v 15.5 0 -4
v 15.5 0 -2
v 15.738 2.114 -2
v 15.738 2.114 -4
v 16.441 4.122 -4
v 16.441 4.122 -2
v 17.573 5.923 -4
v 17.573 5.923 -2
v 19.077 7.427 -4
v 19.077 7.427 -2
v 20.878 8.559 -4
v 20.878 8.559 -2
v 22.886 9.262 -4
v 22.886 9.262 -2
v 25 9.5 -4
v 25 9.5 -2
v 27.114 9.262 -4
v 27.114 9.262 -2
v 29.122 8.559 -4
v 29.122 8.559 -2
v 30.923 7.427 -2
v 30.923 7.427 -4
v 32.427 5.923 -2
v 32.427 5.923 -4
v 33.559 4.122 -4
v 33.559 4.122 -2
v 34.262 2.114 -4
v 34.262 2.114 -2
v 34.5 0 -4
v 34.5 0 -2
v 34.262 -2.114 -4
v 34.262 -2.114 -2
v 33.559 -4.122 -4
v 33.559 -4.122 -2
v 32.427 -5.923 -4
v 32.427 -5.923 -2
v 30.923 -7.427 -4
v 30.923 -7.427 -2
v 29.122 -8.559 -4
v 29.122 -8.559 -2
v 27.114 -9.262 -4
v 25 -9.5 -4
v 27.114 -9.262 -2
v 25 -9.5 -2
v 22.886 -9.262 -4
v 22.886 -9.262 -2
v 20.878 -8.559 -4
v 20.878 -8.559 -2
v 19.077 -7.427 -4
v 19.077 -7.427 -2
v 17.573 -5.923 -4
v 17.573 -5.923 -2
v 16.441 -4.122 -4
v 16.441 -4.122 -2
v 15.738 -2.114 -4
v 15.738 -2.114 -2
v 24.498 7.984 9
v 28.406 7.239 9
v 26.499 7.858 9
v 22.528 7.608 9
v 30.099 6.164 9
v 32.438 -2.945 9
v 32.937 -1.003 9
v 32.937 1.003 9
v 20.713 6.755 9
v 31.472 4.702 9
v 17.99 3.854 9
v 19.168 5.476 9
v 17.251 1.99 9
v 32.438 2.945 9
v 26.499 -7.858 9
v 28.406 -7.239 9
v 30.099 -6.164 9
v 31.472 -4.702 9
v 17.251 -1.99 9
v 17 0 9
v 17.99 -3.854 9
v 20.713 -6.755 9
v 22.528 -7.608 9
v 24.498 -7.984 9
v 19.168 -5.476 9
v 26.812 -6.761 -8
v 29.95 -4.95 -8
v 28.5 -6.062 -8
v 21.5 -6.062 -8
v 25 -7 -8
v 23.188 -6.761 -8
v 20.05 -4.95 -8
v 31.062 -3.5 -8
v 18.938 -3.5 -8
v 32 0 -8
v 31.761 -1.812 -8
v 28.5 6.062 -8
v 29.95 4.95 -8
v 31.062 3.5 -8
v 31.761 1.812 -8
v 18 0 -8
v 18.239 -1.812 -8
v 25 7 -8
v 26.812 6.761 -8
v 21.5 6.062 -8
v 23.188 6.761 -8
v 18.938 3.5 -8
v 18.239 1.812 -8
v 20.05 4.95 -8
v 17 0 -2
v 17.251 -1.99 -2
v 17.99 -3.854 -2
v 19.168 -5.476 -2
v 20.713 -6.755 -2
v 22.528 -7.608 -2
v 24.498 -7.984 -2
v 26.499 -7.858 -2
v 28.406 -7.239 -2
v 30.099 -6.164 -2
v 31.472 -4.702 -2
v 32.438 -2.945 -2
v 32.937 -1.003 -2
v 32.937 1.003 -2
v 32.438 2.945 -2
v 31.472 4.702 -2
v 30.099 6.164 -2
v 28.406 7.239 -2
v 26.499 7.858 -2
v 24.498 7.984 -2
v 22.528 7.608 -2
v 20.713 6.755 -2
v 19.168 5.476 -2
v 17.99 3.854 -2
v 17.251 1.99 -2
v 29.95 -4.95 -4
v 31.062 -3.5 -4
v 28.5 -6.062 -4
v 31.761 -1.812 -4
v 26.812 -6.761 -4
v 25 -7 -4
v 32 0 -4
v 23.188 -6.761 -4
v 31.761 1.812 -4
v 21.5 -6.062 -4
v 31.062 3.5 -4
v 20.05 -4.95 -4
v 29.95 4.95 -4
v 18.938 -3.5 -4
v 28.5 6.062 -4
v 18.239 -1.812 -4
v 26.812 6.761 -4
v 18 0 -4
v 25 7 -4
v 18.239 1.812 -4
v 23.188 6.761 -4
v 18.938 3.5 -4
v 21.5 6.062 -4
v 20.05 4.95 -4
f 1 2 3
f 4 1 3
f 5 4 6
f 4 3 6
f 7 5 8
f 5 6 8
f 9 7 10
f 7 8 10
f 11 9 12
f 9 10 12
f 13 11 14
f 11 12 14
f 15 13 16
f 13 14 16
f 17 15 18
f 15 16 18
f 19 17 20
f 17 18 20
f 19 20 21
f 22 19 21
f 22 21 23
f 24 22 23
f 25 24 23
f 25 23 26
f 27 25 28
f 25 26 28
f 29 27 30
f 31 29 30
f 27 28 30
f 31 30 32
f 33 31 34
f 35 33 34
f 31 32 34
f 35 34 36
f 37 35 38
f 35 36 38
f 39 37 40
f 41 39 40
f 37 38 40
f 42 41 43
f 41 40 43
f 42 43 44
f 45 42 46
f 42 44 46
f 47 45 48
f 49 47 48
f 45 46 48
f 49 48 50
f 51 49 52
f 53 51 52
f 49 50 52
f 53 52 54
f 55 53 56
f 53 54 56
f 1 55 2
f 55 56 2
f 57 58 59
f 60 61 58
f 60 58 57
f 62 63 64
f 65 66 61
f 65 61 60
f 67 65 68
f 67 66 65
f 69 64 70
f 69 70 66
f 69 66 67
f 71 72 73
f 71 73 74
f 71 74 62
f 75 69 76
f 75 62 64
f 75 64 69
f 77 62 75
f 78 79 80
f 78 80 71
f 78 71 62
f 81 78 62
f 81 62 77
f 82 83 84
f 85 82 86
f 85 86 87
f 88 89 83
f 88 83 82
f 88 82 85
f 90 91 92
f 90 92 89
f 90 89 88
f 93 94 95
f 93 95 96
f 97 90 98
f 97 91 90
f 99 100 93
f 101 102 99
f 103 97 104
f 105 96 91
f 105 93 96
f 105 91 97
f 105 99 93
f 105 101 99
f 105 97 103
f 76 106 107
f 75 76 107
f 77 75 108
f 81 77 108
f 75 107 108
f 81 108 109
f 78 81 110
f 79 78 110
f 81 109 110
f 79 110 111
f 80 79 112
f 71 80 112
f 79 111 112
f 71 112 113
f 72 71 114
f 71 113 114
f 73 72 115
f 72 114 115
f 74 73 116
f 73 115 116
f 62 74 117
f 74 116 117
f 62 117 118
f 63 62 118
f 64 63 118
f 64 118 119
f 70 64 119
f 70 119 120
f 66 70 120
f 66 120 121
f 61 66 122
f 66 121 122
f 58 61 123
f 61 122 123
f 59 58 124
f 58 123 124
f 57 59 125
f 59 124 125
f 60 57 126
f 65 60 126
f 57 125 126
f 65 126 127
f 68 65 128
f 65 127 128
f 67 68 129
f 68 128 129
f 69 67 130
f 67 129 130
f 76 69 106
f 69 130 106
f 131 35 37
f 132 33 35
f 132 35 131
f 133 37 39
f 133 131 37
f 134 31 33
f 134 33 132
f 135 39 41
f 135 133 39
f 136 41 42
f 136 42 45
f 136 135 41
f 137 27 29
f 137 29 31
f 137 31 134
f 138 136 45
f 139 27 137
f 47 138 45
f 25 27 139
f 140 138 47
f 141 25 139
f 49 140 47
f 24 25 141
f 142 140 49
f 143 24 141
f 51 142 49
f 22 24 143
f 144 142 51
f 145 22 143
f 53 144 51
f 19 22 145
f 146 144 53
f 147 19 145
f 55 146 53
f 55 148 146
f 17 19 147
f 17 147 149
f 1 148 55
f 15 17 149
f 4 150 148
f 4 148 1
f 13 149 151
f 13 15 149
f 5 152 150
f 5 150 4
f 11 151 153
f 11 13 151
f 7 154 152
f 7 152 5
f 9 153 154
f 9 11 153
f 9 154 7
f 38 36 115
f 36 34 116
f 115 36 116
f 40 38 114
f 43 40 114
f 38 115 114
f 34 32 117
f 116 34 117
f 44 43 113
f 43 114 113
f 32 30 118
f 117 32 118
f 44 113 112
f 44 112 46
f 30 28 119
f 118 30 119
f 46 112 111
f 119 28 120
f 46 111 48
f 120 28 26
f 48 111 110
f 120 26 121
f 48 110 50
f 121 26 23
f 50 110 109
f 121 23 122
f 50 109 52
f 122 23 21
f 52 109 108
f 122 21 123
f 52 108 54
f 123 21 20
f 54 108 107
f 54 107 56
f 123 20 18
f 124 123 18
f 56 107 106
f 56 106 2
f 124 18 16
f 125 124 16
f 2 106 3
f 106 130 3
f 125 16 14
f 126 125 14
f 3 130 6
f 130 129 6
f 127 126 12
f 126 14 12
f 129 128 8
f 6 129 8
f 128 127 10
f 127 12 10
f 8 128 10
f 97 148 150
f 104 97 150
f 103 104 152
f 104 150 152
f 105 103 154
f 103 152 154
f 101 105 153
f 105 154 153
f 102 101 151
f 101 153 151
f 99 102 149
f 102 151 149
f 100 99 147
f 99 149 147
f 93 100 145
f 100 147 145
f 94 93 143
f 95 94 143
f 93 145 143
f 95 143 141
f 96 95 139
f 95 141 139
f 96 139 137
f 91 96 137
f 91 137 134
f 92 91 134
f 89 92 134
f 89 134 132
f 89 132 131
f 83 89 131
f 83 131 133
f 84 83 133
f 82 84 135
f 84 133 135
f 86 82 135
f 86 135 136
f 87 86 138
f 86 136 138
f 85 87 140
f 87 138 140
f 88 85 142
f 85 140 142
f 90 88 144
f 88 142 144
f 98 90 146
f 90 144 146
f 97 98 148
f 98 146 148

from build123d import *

# Parameters (mm, degrees)
SKETCH010_R             = 9.5
PAD008_DEPTH            = 2
SKETCH011_R             = 7
PAD009_DEPTH            = 4
SKETCH012_R             = 8
PAD010_DEPTH            = 11
BODY003_PLACEMENT_ANGLE = 180


with BuildPart() as part:
    # Sketch010 → Pad008 (new body)
    with BuildSketch(Plane.XY):
        Circle(SKETCH010_R)
    extrude(amount=PAD008_DEPTH)

    # Sketch011 (on Face3 of Pad008) → Pad009 (join)
    with BuildSketch(Plane.XY.offset(2)):
        Circle(SKETCH011_R)
    extrude(amount=PAD009_DEPTH)

    # Sketch012 (on Face2 of Pad009) → Pad010 (join)
    with BuildSketch(Plane(origin=(0, 0, 0), x_dir=(1, 0, 0), z_dir=(0, 0, -1))):
        Circle(SKETCH012_R)
    extrude(amount=PAD010_DEPTH)


with BuildPart() as part_1:
    # Body003 placement: moved
    add(part.part.moved(Location((25, 0, -2))).rotate(Axis((25, 0, -2), (0, 1, 0)), BODY003_PLACEMENT_ANGLE))


solid = part_1.part
